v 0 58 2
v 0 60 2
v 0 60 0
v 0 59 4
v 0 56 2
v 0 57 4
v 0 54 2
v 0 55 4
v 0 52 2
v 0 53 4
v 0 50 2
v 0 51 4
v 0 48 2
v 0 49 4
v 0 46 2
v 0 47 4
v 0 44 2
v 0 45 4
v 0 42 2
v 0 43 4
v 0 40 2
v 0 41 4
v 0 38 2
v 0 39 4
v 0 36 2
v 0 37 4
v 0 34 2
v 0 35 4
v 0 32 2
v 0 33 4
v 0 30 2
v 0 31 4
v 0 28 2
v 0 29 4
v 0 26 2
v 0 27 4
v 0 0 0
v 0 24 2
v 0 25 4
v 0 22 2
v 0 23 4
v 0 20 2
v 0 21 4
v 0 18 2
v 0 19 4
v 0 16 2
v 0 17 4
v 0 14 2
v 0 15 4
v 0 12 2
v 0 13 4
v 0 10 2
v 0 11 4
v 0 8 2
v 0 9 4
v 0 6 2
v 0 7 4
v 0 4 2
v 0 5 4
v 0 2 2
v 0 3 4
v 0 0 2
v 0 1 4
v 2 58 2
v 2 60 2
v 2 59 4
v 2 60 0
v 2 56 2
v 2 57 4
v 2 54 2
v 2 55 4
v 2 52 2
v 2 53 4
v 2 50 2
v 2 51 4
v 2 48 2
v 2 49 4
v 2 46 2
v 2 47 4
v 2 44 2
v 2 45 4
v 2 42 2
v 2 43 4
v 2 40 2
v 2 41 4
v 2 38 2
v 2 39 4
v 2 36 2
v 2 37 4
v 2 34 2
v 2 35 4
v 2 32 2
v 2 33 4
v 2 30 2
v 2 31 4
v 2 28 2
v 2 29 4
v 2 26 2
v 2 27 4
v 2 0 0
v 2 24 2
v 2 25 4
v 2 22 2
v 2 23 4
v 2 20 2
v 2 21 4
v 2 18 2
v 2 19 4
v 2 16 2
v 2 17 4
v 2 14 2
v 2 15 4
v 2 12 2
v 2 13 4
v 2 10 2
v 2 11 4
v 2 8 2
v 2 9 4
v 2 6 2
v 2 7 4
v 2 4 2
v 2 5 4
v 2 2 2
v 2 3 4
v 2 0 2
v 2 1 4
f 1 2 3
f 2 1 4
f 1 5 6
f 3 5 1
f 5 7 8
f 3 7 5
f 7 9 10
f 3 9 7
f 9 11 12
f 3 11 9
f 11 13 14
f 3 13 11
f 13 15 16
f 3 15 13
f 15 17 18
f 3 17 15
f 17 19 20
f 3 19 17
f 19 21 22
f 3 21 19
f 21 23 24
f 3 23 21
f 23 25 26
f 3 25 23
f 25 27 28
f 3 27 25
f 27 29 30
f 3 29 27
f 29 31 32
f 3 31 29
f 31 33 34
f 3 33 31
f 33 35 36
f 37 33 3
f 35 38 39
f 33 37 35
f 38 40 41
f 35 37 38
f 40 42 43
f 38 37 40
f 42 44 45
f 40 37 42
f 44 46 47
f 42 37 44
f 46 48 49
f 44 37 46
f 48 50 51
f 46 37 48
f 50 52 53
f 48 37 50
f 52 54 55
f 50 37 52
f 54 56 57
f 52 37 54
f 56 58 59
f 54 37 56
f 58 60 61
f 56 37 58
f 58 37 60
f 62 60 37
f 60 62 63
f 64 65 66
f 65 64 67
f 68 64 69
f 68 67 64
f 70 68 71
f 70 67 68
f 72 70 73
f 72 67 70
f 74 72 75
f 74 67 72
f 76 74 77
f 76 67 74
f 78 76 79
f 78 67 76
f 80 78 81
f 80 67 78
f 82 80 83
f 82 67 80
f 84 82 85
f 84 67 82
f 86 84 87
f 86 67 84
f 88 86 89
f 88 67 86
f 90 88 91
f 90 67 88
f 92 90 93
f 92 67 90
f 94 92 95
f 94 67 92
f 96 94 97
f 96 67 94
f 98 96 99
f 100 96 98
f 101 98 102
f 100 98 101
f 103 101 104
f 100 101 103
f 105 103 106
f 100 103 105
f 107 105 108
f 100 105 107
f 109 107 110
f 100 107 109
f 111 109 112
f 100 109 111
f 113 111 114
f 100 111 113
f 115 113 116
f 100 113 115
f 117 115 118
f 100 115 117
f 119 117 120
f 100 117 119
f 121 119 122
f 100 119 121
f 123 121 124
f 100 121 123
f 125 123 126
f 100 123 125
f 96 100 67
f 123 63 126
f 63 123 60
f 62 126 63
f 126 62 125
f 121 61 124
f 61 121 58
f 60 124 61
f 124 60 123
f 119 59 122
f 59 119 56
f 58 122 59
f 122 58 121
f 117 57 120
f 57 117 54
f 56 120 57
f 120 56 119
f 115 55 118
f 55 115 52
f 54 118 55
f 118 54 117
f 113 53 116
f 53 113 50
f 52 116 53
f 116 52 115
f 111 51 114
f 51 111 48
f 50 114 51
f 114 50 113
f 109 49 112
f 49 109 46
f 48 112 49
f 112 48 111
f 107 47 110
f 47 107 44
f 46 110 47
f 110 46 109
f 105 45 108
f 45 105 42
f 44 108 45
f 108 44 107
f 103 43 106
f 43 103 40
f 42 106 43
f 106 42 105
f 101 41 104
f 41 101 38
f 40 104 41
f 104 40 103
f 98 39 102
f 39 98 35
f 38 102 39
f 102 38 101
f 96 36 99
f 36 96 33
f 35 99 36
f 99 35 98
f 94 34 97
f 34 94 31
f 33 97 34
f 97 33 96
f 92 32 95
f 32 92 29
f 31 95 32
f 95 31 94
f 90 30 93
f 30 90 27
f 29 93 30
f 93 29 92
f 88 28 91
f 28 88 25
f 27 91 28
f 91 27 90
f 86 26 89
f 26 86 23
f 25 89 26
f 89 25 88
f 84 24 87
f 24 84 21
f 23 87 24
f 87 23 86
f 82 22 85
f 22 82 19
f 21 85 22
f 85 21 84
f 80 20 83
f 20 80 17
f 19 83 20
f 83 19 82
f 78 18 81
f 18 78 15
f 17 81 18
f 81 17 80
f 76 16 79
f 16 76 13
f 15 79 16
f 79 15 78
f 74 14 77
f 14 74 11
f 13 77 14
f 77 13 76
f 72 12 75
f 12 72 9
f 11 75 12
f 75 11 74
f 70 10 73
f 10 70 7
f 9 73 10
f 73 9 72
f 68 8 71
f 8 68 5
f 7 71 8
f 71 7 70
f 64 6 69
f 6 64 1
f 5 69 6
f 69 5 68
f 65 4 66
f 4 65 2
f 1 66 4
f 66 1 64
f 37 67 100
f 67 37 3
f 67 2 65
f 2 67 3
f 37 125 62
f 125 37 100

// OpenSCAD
module zub(){linear_extrude(height = 2, convexity = 10, twist = 0, slices = 50, scale = 1.0) {polygon(points = [[0,0],[2,0],[1,2]]);}}

cube([2,60,2]);

for (y = [0:29]){translate([0, 2*y, 0])
translate([0,0,2]){rotate([90,0,90]){zub();}}}
